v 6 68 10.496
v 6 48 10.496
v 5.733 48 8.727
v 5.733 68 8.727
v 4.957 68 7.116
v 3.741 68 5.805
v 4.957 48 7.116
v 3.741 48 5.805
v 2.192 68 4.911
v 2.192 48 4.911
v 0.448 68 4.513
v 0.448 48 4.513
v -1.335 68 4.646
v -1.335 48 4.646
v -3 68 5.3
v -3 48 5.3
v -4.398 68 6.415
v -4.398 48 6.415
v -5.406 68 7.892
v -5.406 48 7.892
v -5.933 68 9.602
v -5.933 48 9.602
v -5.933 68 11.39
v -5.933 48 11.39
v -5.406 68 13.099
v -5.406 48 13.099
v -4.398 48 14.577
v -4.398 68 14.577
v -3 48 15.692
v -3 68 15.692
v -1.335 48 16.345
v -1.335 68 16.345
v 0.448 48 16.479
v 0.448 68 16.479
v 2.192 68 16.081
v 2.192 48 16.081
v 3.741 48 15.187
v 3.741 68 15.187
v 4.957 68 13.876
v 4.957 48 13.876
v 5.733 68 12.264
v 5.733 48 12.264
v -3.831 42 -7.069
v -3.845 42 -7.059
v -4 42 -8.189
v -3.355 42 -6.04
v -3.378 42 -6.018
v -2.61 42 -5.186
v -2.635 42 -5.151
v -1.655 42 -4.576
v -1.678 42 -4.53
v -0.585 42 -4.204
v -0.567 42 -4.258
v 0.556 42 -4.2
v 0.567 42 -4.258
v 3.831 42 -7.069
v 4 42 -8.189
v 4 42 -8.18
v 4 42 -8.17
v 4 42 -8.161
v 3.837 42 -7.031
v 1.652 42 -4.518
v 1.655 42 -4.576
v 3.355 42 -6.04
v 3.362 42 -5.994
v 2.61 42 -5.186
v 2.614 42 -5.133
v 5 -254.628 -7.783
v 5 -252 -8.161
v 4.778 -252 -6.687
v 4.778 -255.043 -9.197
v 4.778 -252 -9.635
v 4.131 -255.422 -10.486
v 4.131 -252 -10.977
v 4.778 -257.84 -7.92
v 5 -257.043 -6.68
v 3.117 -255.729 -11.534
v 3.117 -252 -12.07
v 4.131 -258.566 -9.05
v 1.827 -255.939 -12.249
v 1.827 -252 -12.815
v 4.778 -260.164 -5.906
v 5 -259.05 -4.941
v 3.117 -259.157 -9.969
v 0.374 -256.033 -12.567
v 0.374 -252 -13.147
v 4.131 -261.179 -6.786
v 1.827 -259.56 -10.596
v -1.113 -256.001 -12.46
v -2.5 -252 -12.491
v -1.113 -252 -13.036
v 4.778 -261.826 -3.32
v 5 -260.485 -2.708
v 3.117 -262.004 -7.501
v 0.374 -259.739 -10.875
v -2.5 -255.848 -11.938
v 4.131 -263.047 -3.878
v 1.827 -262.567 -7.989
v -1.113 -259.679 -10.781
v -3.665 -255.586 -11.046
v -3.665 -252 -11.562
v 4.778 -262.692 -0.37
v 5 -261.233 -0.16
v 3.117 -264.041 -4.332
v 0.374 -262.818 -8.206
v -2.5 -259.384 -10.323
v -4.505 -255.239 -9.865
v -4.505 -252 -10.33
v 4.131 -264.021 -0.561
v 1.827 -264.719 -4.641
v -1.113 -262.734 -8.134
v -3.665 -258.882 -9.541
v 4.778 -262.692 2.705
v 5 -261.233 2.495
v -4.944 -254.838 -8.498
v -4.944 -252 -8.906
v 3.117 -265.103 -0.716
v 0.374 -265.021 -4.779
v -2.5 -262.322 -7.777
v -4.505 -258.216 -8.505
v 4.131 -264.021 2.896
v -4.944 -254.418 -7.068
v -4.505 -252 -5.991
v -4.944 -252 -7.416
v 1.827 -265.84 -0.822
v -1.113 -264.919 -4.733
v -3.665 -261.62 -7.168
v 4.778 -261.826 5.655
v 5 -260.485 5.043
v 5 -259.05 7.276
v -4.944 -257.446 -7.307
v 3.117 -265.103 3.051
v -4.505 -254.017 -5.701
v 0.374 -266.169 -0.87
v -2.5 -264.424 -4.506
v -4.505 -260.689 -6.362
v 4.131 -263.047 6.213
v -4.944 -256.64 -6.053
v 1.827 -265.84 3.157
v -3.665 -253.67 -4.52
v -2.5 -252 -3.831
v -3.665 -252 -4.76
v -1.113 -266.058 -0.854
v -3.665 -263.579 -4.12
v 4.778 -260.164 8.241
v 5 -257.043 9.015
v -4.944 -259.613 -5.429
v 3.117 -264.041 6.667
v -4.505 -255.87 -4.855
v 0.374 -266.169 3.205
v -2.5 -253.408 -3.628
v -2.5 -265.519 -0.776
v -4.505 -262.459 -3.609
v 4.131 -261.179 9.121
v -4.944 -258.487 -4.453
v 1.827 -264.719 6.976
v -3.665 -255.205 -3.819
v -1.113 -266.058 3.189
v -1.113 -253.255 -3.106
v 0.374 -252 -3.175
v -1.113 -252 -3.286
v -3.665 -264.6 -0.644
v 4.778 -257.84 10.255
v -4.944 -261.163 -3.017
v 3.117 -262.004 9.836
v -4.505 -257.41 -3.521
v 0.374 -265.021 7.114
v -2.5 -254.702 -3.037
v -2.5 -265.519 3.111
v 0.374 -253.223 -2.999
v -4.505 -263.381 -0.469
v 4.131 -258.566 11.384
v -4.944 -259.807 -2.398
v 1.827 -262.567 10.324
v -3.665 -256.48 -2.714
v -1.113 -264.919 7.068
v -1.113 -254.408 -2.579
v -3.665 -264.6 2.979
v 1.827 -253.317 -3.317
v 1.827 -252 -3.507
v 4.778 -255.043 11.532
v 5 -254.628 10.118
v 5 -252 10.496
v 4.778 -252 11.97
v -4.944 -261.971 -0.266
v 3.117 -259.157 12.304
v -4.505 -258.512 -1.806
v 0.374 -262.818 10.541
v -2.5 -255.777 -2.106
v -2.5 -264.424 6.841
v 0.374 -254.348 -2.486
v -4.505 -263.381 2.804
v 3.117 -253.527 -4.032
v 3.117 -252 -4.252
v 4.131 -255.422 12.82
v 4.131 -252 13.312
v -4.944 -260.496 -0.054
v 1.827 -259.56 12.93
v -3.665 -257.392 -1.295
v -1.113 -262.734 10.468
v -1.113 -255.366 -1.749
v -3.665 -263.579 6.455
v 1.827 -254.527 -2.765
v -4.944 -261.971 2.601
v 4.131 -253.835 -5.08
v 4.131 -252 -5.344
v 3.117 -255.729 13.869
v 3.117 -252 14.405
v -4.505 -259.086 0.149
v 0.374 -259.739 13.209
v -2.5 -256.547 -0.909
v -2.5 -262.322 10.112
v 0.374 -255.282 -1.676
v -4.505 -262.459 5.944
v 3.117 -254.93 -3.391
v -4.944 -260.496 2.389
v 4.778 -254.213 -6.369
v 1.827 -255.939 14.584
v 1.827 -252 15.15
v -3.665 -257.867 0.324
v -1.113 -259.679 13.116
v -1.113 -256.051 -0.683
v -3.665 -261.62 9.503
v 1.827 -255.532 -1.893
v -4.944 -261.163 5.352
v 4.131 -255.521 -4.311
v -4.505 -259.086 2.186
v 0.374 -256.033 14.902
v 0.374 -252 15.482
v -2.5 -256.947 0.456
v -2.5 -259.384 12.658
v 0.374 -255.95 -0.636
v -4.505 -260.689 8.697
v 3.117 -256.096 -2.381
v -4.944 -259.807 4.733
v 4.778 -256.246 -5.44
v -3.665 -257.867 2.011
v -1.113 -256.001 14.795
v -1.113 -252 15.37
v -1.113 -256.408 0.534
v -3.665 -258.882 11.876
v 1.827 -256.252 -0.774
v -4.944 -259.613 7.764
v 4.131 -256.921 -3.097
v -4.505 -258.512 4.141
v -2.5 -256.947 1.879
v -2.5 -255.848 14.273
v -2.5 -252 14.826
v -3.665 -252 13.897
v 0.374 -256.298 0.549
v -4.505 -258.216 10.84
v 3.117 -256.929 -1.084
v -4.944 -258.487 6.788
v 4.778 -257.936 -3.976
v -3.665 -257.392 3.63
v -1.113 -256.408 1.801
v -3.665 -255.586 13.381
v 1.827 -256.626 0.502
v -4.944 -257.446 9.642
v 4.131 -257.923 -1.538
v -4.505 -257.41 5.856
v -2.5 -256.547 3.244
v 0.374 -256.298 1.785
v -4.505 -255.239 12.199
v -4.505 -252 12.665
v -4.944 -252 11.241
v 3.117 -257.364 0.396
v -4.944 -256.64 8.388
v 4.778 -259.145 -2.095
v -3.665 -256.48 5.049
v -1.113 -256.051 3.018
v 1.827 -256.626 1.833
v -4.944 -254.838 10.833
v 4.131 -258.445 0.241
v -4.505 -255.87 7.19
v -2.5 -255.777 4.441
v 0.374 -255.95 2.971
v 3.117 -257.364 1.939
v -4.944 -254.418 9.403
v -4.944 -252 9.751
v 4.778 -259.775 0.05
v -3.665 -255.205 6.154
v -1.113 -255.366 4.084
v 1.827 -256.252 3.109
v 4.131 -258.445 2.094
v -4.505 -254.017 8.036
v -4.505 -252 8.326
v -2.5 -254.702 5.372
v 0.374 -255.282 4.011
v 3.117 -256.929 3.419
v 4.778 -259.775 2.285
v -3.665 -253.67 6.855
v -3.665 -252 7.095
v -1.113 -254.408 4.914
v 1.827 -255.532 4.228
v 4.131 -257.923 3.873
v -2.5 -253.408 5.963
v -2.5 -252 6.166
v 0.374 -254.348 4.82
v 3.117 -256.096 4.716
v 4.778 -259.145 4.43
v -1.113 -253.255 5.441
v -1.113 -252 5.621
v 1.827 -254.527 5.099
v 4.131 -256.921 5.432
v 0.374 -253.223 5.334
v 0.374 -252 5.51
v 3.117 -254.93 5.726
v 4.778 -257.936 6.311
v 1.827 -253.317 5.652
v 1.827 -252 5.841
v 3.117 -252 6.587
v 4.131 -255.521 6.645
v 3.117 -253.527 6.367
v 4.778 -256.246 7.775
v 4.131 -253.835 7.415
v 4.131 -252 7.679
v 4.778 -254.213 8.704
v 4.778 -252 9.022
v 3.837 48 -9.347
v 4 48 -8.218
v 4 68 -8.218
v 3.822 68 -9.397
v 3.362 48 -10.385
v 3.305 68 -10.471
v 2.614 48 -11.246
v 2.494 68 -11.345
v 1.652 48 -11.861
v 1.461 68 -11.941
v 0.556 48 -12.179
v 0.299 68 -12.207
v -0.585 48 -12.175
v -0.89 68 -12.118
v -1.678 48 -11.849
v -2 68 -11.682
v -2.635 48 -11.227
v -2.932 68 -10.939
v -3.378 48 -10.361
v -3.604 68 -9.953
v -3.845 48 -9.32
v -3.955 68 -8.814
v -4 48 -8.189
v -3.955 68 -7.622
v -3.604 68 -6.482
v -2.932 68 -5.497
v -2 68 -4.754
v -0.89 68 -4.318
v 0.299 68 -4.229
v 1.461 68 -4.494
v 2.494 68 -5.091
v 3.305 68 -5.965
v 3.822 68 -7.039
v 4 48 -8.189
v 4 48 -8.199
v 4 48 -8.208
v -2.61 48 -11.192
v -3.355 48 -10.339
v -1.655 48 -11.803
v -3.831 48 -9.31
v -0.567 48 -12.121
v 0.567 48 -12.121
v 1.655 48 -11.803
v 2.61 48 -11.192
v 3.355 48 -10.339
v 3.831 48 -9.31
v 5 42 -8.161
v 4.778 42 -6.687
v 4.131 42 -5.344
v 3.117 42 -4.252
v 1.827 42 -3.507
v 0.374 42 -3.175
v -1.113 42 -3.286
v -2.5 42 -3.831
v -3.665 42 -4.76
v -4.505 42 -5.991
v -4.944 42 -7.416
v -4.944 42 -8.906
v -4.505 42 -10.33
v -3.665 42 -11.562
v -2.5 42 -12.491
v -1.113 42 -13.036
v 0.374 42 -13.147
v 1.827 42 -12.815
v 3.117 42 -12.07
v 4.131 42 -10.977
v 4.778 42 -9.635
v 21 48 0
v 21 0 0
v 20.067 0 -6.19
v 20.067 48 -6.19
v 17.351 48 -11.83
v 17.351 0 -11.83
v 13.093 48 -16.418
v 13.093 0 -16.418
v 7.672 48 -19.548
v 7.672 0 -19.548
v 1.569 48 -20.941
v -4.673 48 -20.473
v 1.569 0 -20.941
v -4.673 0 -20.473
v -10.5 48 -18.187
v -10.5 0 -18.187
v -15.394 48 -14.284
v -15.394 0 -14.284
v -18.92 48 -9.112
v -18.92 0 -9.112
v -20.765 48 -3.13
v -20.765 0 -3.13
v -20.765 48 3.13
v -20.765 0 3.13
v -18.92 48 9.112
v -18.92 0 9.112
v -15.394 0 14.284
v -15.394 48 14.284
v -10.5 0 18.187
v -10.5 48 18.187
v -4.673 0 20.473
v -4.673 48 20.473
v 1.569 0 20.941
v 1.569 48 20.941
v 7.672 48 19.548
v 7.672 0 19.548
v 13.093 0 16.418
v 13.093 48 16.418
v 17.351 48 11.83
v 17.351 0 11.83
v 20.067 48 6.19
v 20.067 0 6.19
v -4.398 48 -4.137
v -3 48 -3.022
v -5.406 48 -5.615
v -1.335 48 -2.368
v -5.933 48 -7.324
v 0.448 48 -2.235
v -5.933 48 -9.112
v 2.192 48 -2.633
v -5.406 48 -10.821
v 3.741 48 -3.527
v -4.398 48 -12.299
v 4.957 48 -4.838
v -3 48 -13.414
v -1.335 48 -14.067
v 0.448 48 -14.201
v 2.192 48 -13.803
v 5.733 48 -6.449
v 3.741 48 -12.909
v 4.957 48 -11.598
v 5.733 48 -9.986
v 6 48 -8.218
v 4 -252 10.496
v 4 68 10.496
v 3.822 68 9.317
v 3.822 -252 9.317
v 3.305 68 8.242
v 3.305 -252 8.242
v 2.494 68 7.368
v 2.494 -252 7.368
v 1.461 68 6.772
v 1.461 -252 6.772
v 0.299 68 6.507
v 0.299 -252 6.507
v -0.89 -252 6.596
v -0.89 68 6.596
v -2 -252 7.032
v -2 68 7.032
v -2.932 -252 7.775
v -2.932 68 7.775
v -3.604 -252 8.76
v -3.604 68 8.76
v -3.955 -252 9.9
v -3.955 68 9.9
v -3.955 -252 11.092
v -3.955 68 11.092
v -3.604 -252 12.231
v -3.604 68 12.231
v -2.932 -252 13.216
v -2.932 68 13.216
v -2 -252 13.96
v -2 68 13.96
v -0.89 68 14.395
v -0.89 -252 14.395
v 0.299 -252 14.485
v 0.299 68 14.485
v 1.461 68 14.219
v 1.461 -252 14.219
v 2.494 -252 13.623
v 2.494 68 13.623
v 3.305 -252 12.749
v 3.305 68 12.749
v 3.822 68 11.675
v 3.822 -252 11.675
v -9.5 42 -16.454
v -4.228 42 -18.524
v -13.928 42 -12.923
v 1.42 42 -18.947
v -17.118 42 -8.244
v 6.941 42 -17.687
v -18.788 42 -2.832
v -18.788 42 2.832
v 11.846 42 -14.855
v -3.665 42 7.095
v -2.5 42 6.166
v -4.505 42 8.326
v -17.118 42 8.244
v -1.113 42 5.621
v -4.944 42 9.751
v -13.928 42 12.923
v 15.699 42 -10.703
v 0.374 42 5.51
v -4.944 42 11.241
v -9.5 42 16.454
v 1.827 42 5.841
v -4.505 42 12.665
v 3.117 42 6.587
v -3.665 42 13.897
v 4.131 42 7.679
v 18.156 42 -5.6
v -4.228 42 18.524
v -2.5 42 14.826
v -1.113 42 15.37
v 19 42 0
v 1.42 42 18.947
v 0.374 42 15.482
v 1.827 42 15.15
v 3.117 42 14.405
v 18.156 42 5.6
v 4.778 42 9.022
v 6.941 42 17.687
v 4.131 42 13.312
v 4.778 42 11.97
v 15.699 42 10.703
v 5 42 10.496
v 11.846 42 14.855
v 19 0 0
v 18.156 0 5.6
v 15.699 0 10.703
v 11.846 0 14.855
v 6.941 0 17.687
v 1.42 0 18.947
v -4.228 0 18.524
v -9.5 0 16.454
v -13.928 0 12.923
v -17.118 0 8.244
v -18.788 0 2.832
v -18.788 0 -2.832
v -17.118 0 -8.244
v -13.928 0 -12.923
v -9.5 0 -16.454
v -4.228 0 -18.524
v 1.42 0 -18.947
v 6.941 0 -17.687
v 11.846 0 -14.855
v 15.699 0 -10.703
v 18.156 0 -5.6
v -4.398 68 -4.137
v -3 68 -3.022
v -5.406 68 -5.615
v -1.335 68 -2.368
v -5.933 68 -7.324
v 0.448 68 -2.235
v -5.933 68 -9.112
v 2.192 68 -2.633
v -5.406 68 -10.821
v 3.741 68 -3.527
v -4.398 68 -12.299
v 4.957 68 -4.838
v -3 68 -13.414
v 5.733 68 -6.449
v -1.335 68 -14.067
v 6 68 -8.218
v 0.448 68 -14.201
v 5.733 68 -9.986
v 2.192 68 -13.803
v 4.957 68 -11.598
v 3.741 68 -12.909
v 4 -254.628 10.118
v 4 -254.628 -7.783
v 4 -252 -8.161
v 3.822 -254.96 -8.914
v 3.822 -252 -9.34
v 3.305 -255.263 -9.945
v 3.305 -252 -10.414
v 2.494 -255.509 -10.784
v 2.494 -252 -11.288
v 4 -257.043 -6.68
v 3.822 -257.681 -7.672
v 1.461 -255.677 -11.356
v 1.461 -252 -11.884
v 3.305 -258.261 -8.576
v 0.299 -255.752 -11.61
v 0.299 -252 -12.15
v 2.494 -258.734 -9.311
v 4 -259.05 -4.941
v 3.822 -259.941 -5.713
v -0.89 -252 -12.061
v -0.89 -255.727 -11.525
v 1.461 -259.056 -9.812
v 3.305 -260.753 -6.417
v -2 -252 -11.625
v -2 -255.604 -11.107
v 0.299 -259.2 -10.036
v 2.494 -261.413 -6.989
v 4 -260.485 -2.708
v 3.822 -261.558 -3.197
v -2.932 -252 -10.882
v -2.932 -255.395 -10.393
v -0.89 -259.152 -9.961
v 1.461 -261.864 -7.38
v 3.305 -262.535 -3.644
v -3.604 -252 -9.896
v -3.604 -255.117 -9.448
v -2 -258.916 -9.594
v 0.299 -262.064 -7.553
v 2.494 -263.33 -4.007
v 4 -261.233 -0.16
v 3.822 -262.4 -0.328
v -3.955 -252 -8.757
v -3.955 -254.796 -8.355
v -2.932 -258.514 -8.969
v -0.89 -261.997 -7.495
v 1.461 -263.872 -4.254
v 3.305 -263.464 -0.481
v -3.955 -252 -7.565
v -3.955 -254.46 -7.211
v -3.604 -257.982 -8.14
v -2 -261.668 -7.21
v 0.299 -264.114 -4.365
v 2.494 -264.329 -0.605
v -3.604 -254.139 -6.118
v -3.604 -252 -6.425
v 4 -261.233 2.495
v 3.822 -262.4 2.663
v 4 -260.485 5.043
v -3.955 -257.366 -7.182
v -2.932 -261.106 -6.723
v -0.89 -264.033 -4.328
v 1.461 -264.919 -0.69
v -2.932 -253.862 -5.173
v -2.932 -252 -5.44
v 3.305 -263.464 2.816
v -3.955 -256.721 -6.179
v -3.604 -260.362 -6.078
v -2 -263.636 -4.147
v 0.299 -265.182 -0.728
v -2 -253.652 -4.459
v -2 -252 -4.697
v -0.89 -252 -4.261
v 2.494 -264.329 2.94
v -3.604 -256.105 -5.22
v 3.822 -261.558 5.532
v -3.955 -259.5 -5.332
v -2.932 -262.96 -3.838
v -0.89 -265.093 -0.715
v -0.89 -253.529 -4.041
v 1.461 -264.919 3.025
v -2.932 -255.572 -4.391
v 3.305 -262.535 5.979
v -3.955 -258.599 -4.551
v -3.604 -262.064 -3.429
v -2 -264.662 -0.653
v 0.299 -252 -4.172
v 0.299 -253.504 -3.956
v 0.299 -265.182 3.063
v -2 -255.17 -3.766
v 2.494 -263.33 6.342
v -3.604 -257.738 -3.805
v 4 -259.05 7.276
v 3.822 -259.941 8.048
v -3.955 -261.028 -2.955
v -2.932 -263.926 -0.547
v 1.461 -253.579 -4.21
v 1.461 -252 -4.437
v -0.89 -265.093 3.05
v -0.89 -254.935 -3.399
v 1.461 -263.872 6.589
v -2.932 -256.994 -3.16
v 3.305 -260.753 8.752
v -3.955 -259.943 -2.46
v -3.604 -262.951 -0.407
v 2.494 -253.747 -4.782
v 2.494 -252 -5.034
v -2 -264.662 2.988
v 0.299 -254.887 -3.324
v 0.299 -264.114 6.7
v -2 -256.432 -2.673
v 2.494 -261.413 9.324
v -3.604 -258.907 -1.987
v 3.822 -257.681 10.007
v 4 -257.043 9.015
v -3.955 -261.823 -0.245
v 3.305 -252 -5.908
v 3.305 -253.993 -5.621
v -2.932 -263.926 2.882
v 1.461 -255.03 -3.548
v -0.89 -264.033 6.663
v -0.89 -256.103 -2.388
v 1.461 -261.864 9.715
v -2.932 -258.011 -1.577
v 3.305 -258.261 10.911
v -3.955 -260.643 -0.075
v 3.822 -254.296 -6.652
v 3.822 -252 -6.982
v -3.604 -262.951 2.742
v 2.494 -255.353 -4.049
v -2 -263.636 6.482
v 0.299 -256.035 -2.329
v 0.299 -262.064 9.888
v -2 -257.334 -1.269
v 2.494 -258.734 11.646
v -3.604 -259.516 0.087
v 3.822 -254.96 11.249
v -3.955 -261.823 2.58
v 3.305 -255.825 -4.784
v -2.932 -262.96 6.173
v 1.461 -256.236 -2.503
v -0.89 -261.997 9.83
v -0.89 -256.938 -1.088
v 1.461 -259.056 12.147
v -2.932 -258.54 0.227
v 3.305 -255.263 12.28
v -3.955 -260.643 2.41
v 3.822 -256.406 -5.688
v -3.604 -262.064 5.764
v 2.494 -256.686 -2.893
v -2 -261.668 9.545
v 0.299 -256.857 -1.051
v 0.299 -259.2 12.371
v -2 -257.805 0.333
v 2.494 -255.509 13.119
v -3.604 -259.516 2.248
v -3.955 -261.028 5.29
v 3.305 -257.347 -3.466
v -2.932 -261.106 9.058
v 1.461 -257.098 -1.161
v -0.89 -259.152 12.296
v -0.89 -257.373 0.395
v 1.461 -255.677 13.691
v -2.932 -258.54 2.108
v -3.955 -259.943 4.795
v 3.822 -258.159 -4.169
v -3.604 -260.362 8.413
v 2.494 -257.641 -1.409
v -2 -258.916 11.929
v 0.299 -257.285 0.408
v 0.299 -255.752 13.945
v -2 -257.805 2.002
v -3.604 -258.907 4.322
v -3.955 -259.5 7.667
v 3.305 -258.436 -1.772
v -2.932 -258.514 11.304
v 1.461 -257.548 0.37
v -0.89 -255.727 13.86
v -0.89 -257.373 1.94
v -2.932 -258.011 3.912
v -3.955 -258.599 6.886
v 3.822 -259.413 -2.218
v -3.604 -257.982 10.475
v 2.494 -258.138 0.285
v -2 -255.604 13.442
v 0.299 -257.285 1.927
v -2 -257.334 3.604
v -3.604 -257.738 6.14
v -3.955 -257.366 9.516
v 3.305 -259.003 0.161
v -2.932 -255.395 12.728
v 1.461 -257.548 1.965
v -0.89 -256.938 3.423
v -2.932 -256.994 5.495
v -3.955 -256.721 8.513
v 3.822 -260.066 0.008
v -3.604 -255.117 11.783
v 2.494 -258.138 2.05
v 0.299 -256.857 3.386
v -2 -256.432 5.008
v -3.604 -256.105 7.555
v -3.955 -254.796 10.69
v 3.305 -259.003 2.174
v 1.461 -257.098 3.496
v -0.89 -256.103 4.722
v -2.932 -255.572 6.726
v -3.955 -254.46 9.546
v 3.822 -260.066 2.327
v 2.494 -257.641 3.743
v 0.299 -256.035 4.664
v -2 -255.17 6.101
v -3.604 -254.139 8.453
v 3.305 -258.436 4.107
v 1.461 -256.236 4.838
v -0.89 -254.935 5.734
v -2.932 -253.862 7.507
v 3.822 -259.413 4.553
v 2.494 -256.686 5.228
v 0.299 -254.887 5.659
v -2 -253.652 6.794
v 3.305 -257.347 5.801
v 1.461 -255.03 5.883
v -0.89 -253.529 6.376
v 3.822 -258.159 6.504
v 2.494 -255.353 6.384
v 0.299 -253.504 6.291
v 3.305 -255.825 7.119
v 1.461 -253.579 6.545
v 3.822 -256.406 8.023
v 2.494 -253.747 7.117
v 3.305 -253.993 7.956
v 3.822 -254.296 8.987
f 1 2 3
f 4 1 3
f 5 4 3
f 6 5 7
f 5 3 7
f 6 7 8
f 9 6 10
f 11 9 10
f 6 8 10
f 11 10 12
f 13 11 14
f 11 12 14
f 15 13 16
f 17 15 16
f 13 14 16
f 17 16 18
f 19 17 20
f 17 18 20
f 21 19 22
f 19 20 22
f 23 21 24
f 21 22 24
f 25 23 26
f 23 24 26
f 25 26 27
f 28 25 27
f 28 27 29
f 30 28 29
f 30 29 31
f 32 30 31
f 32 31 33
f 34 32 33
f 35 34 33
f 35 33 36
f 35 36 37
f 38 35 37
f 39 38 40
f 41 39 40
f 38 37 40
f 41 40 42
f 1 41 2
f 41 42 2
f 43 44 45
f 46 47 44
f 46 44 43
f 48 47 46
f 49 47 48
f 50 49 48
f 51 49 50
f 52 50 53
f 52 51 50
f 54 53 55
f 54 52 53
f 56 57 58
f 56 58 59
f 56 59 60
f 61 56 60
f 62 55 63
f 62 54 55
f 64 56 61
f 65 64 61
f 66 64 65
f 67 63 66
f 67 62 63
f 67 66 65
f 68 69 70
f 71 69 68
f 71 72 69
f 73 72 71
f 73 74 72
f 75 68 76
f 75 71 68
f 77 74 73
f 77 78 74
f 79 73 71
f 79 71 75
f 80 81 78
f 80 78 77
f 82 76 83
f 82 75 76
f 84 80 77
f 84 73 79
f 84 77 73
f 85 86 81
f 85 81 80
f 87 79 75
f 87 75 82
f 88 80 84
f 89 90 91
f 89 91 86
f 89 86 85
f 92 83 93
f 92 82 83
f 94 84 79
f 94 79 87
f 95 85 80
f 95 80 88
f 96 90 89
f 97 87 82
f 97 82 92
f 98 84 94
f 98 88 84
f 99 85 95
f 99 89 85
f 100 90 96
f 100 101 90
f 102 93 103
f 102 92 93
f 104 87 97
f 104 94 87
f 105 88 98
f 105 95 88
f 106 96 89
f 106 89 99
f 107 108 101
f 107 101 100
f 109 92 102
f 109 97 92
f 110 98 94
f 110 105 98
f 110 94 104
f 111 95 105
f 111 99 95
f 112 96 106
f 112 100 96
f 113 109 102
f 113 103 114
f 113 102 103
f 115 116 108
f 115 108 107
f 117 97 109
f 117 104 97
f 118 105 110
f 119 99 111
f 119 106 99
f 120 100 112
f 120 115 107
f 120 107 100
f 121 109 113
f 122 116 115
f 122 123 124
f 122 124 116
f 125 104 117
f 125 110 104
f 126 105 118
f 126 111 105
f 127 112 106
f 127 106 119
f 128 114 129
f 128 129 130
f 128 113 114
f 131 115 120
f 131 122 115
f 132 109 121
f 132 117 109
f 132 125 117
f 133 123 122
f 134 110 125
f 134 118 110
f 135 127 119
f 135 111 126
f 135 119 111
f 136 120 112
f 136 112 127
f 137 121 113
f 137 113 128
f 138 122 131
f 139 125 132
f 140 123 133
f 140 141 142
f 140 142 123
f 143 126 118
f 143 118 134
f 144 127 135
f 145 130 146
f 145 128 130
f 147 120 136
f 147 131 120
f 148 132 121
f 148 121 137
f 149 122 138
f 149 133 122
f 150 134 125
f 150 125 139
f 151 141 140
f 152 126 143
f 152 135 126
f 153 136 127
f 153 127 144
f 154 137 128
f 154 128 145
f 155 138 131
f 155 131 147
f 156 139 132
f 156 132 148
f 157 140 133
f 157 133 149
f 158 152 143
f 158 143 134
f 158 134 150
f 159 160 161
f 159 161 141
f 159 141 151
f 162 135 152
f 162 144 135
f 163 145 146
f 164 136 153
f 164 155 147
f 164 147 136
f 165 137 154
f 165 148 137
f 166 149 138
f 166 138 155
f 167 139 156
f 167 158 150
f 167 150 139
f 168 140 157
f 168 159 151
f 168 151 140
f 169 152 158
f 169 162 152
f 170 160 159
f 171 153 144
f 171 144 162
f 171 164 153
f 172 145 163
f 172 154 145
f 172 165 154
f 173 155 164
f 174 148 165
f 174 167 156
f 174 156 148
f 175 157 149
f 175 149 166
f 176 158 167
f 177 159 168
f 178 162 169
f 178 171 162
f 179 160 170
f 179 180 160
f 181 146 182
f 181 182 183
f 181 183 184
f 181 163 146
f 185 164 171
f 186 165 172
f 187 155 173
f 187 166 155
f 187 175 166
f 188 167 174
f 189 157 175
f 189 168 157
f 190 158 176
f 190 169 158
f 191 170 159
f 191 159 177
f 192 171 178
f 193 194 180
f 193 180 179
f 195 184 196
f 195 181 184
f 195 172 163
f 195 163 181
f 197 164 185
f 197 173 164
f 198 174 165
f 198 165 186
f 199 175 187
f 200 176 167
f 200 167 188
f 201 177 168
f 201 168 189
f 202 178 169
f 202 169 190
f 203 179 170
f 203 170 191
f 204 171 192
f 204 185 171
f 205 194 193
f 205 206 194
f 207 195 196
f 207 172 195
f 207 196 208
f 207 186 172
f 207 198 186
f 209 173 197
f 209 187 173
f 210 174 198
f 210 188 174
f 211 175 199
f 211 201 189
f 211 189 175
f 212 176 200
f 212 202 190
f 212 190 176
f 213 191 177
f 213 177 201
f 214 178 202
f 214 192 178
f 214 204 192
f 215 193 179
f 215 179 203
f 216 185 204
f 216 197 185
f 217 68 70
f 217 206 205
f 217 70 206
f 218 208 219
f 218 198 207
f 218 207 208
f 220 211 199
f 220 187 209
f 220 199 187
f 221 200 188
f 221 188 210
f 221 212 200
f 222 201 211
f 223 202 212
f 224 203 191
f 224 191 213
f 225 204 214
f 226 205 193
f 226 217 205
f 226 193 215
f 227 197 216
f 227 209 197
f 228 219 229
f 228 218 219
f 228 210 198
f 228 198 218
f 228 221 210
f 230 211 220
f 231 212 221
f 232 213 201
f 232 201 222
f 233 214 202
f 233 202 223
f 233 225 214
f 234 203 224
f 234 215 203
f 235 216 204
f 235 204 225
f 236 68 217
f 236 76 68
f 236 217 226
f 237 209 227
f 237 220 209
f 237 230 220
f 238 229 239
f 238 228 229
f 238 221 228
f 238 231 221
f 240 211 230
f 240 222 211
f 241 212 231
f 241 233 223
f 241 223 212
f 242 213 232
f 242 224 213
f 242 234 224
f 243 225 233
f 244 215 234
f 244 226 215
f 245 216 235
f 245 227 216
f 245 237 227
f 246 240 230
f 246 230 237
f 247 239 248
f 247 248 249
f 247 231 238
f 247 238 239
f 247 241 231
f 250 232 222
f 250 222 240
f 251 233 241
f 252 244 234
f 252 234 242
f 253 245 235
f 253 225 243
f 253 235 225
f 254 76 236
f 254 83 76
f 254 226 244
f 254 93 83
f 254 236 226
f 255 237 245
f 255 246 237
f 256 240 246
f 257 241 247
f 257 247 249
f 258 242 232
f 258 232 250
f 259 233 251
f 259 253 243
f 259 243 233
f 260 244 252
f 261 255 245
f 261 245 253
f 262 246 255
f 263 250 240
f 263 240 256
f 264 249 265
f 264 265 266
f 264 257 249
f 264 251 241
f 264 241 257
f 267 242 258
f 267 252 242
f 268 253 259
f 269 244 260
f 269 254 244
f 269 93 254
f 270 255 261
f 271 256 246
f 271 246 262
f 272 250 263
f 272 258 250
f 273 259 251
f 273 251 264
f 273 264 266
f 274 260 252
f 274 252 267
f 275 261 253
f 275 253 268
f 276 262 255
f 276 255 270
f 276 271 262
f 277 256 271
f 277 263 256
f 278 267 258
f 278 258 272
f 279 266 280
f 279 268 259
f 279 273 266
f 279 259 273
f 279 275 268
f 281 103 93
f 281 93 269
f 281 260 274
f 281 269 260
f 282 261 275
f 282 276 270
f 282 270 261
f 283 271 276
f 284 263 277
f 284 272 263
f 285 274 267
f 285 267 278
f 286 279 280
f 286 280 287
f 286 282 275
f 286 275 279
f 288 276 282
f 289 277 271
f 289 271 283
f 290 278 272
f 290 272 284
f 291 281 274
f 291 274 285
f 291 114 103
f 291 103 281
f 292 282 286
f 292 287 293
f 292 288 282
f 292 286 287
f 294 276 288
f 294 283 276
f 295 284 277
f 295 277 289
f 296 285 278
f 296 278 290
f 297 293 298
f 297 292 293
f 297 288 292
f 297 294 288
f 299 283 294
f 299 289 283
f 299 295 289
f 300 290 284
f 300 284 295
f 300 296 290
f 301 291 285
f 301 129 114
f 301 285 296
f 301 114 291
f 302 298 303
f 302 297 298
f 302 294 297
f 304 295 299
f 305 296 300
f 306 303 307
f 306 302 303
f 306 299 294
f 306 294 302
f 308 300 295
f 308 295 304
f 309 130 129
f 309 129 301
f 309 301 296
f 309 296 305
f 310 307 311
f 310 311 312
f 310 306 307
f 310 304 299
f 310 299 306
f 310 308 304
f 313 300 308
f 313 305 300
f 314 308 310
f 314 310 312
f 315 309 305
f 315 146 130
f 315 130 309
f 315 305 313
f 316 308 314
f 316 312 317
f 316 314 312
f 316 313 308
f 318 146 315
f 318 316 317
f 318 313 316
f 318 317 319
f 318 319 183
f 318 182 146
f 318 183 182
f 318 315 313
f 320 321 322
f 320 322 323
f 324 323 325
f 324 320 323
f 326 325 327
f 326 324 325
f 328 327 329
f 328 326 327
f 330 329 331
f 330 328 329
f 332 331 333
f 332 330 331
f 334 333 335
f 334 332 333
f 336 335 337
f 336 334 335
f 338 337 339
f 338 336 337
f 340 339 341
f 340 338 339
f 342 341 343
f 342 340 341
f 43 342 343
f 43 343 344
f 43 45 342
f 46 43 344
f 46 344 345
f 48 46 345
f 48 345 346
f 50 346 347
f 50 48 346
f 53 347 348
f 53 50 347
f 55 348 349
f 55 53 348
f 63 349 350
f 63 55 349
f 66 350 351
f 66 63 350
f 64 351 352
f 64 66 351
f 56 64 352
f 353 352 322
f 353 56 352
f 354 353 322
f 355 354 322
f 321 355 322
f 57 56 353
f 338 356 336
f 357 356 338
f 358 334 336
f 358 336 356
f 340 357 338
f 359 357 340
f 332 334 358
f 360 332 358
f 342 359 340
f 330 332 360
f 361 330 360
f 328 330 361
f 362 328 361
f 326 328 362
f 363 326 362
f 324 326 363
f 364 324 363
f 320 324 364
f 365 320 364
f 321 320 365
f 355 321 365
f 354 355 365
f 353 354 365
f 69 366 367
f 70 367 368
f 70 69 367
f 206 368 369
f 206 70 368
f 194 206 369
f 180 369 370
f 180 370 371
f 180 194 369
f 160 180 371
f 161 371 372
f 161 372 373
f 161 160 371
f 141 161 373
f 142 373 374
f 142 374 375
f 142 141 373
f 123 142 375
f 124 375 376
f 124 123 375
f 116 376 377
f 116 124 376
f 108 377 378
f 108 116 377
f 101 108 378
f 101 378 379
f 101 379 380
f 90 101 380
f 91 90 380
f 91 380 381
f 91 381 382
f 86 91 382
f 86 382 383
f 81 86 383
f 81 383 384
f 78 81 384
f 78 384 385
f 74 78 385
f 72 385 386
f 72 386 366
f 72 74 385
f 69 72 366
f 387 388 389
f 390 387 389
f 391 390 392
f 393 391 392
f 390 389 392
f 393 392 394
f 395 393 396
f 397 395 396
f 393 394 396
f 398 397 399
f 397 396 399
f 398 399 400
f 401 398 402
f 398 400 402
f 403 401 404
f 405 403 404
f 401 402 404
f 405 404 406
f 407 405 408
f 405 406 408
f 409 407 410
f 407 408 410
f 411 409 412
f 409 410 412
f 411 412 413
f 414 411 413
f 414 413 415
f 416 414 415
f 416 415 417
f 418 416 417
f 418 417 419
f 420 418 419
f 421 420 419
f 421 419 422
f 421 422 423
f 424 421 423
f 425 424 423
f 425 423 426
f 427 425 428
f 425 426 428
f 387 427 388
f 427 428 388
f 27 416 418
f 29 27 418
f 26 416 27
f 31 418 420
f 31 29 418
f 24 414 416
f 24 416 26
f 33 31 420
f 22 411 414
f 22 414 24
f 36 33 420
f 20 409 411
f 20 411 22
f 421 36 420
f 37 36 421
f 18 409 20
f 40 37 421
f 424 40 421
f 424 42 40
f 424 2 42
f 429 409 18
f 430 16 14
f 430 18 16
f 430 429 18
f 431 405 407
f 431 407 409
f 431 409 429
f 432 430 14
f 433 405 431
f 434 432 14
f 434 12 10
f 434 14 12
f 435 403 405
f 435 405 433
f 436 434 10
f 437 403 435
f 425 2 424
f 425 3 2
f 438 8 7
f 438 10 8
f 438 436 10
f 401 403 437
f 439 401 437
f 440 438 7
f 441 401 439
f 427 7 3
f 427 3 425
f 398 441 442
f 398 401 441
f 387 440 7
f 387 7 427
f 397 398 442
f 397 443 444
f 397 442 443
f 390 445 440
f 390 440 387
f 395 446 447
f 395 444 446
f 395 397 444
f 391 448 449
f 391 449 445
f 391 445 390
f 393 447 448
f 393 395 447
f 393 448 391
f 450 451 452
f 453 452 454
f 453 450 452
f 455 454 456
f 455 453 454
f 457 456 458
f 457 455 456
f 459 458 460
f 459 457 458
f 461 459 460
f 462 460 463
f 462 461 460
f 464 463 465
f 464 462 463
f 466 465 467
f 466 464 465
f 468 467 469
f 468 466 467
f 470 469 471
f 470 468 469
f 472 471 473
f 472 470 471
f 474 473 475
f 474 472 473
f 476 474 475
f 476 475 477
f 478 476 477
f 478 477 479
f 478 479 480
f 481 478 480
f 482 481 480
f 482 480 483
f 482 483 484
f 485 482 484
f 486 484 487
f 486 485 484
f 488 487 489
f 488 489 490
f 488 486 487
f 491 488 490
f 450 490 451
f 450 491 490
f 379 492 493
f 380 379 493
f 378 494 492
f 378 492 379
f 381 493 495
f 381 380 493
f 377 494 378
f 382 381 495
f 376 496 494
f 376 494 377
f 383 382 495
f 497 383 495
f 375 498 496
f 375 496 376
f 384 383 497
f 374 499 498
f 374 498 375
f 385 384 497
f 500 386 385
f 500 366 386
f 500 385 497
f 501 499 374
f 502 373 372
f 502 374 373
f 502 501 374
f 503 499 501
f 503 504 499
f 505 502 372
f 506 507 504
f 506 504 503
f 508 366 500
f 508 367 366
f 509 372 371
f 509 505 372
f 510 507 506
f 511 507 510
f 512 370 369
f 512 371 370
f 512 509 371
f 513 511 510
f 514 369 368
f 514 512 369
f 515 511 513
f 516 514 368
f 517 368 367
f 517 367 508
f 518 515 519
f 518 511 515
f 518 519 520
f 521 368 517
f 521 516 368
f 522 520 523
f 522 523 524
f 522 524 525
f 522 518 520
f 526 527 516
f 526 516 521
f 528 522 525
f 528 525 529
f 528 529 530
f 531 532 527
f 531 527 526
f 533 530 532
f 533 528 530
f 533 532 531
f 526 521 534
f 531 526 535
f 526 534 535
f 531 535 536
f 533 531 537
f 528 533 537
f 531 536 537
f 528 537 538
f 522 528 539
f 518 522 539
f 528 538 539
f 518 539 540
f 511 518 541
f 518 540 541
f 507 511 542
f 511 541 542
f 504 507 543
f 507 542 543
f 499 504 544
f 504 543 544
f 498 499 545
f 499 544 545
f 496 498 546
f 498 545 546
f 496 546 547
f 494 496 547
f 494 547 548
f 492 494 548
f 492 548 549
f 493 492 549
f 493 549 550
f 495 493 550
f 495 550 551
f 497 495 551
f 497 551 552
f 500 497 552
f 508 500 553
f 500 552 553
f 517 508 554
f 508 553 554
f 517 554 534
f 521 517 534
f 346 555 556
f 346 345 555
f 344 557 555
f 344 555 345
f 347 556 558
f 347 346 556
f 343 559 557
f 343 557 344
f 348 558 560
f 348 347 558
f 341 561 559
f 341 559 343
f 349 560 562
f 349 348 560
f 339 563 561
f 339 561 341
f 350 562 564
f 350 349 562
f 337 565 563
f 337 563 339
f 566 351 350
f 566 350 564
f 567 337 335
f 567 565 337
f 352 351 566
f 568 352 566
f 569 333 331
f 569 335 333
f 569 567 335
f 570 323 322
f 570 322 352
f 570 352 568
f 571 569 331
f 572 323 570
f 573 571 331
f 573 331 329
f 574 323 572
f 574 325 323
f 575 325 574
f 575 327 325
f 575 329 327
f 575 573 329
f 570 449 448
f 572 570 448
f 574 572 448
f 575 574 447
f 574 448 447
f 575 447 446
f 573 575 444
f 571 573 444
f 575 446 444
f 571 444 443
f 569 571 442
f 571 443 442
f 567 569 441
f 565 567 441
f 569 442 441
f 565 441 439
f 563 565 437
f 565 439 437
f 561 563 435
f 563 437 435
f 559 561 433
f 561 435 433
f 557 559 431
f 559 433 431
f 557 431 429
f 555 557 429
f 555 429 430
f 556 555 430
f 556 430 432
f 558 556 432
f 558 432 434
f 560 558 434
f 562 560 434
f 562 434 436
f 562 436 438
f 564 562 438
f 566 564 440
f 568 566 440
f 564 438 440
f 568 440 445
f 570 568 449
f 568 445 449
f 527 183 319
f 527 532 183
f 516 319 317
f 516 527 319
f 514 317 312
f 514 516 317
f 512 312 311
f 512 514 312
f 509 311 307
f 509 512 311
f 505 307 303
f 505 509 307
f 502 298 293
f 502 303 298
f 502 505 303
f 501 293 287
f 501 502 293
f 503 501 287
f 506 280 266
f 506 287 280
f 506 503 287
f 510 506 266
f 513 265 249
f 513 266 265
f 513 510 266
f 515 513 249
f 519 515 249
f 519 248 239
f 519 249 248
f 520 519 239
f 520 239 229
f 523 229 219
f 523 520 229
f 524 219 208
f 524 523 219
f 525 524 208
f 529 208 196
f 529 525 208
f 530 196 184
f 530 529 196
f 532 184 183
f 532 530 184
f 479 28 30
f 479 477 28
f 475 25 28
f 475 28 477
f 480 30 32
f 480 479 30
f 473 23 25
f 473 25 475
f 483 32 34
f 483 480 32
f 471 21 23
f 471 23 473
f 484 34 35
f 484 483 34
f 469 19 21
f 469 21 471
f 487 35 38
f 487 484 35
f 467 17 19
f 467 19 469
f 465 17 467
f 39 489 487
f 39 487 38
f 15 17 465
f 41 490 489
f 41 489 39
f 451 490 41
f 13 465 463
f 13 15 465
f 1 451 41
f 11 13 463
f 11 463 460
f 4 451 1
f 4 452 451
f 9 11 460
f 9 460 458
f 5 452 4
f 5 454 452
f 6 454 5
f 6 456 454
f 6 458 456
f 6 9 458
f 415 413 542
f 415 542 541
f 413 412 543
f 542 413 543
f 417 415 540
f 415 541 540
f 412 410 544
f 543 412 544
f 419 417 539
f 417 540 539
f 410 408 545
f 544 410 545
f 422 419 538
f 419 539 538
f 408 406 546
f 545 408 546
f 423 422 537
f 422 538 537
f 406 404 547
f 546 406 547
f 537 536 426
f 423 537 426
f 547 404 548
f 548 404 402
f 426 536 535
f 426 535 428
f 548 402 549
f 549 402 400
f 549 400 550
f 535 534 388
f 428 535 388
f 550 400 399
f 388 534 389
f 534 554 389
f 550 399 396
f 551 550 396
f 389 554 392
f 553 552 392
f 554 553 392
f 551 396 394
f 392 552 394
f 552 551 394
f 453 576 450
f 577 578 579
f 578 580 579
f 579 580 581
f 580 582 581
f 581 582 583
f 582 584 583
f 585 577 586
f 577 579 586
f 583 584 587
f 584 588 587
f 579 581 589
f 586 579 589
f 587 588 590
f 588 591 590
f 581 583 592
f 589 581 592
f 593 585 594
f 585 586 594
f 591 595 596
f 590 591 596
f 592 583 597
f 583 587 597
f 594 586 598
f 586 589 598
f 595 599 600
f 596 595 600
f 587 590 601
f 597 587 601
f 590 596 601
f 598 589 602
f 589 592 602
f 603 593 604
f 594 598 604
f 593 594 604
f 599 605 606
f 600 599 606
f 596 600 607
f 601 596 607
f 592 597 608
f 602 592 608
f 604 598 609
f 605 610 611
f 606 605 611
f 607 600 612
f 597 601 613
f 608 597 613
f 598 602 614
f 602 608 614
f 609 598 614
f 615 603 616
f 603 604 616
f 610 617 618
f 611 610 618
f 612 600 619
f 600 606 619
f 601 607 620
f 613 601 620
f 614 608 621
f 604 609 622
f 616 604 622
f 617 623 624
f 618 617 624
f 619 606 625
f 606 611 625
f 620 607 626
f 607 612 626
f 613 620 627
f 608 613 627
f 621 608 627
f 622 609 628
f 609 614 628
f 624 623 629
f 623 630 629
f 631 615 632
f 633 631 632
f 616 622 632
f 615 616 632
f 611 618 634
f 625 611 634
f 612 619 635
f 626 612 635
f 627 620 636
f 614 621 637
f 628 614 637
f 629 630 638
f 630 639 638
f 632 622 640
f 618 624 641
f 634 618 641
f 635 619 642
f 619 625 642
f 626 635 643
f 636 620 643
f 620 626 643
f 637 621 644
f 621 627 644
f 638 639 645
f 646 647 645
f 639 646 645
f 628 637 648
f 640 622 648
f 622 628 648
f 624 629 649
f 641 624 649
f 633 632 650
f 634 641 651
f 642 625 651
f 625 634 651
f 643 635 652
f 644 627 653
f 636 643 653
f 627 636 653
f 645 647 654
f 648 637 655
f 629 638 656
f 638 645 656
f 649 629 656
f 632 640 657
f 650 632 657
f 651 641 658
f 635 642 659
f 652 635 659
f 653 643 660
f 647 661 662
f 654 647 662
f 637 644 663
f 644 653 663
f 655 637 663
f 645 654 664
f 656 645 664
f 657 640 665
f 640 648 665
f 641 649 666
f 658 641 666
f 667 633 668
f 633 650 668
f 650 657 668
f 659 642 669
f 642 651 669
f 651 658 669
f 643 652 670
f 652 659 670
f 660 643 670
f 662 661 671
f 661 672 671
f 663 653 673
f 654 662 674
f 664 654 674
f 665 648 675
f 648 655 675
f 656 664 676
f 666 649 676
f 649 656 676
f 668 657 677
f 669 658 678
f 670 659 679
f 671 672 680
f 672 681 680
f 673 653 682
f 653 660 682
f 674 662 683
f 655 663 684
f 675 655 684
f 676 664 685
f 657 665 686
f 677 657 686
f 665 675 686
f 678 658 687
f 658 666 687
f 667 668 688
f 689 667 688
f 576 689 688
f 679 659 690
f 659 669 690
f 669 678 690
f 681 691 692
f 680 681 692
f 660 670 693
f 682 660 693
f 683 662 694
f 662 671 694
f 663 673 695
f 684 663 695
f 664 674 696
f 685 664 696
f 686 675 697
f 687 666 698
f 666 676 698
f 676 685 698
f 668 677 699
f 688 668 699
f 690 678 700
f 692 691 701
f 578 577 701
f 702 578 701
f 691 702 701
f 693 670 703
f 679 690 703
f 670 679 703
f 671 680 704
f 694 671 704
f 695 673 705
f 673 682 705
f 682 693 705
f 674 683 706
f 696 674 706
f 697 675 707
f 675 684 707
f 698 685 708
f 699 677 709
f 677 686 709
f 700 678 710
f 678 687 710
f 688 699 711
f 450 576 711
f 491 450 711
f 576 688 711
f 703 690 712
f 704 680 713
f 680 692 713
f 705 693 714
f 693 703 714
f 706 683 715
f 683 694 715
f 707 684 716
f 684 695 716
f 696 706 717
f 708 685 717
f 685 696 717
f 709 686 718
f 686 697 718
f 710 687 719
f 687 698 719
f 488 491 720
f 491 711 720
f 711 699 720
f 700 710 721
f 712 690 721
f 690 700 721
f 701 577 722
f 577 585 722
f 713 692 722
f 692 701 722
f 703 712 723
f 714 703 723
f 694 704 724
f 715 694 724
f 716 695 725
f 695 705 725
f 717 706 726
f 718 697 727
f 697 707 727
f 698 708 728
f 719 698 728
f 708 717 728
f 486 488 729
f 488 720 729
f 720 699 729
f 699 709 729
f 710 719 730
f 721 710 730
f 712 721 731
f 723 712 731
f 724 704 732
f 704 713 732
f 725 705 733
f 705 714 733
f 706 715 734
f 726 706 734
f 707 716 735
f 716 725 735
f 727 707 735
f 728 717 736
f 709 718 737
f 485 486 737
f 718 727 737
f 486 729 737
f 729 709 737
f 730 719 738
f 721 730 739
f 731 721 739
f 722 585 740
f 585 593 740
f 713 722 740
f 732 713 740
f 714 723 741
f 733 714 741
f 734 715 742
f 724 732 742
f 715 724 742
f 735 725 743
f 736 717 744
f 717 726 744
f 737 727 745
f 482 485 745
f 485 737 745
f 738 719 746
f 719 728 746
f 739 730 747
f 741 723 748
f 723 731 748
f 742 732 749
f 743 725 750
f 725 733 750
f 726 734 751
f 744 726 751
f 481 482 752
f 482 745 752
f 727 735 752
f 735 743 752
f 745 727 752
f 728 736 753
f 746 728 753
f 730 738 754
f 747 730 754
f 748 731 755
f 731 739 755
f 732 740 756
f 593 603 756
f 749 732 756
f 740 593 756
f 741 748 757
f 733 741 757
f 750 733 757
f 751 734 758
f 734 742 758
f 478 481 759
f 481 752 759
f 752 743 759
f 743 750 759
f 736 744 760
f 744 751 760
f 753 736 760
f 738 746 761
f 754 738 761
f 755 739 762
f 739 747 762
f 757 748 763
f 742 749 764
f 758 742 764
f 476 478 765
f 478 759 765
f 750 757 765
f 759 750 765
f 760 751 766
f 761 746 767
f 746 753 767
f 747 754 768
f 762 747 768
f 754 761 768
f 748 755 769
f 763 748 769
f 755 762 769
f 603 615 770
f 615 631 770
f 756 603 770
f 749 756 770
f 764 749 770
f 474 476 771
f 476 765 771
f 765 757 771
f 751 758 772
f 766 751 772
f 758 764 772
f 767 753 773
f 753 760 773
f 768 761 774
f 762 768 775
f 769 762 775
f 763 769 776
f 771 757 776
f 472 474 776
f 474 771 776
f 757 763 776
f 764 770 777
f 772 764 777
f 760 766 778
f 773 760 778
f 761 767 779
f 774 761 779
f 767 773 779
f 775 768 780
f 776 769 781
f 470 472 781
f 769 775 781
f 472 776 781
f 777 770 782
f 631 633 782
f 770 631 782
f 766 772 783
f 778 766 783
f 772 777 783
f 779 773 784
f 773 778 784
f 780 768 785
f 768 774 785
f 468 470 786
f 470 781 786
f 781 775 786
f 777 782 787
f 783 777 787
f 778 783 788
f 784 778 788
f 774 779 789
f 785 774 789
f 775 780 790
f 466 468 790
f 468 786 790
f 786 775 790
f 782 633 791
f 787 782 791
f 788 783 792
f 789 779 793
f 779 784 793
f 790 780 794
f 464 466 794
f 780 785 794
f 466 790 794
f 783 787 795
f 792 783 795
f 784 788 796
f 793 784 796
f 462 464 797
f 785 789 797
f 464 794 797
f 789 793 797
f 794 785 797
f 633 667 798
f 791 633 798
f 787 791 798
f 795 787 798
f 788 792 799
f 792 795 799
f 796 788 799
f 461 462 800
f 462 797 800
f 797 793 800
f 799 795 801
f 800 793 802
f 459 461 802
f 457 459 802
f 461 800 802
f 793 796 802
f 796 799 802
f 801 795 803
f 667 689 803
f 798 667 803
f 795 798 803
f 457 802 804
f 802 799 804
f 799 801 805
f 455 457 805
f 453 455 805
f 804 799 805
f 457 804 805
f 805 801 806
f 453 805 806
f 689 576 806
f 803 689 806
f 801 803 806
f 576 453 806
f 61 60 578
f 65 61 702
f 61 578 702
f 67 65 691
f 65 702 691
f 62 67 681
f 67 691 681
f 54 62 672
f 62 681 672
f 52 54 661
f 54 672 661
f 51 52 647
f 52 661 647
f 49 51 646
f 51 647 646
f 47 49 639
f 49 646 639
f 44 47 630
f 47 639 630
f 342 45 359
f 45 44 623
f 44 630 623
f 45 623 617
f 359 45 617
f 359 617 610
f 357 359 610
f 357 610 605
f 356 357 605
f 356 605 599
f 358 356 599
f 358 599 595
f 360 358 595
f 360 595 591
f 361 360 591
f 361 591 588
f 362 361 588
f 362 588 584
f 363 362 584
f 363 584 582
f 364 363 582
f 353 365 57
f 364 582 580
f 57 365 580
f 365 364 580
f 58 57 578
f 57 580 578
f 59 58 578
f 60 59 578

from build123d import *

# Parameters (mm, degrees)
SKETCH1_R           = 21
SKETCH1_R_2         = 4
BOSS_EXTRUDE1_DEPTH = 48
SKETCH2_R           = 19
CUT_EXTRUDE1_DEPTH  = 42
SKETCH3_R           = 6
SKETCH3_R_2         = 4
BOSS_EXTRUDE2_DEPTH = 20
SKETCH7_R           = 5
SKETCH7_R_2         = 4


with BuildPart() as part:
    # Sketch1 → Boss-Extrude1 (new body)
    with BuildSketch(Plane(origin=(0, 0, 0), x_dir=(1, 0, 0), z_dir=(0, 1, 0))):
        Circle(SKETCH1_R)
        with Locations((0, -10.495775772)):
            Circle(SKETCH1_R_2, mode=Mode.SUBTRACT)
        with Locations((0, 8.217839423)):
            Circle(SKETCH1_R_2, mode=Mode.SUBTRACT)
    extrude(amount=BOSS_EXTRUDE1_DEPTH)

    # Sketch2 → Cut-Extrude1 (cut)
    with BuildSketch(Plane.XZ):
        Circle(SKETCH2_R)
    extrude(amount=-CUT_EXTRUDE1_DEPTH, mode=Mode.SUBTRACT)

    # Sketch3 → Boss-Extrude2 (add)
    with BuildSketch(Plane(origin=(0, 48, 0), x_dir=(1, 0, 0), z_dir=(0, 1, 0))):
        with Locations((0, 8.217839423)):
            Circle(SKETCH3_R)
        with Locations((0, 8.217839423)):
            Circle(SKETCH3_R_2, mode=Mode.SUBTRACT)
        with Locations((0, -10.495775772)):
            Circle(SKETCH3_R)
        with Locations((0, -10.495775772)):
            Circle(SKETCH3_R_2, mode=Mode.SUBTRACT)
    extrude(amount=BOSS_EXTRUDE2_DEPTH)

    # Sweep9: sweep along a path in Sketch4
    with BuildLine(Plane(origin=(0, 0, 0), x_dir=(0, 0, -1), z_dir=(1, 0, 0))) as sweep9_path:
        Line((8.160870432, 48), (8.160870432, -252))
        ThreePointArc((8.160870432, -252), (-1.16745267, -261.328323102), (-10.495775772, -252))
        Line((-10.495775772, -252), (-10.495775772, 48))
    # Sketch7 → Sweep9 (sweep)
    with BuildSketch(Plane.XZ.offset(-42)):
        with Locations((0, 10.495775772)):
            Circle(SKETCH7_R)
        with Locations((0, 10.495775772)):
            Circle(SKETCH7_R_2, mode=Mode.SUBTRACT)
    sweep(path=sweep9_path.line)


solid = part.part
